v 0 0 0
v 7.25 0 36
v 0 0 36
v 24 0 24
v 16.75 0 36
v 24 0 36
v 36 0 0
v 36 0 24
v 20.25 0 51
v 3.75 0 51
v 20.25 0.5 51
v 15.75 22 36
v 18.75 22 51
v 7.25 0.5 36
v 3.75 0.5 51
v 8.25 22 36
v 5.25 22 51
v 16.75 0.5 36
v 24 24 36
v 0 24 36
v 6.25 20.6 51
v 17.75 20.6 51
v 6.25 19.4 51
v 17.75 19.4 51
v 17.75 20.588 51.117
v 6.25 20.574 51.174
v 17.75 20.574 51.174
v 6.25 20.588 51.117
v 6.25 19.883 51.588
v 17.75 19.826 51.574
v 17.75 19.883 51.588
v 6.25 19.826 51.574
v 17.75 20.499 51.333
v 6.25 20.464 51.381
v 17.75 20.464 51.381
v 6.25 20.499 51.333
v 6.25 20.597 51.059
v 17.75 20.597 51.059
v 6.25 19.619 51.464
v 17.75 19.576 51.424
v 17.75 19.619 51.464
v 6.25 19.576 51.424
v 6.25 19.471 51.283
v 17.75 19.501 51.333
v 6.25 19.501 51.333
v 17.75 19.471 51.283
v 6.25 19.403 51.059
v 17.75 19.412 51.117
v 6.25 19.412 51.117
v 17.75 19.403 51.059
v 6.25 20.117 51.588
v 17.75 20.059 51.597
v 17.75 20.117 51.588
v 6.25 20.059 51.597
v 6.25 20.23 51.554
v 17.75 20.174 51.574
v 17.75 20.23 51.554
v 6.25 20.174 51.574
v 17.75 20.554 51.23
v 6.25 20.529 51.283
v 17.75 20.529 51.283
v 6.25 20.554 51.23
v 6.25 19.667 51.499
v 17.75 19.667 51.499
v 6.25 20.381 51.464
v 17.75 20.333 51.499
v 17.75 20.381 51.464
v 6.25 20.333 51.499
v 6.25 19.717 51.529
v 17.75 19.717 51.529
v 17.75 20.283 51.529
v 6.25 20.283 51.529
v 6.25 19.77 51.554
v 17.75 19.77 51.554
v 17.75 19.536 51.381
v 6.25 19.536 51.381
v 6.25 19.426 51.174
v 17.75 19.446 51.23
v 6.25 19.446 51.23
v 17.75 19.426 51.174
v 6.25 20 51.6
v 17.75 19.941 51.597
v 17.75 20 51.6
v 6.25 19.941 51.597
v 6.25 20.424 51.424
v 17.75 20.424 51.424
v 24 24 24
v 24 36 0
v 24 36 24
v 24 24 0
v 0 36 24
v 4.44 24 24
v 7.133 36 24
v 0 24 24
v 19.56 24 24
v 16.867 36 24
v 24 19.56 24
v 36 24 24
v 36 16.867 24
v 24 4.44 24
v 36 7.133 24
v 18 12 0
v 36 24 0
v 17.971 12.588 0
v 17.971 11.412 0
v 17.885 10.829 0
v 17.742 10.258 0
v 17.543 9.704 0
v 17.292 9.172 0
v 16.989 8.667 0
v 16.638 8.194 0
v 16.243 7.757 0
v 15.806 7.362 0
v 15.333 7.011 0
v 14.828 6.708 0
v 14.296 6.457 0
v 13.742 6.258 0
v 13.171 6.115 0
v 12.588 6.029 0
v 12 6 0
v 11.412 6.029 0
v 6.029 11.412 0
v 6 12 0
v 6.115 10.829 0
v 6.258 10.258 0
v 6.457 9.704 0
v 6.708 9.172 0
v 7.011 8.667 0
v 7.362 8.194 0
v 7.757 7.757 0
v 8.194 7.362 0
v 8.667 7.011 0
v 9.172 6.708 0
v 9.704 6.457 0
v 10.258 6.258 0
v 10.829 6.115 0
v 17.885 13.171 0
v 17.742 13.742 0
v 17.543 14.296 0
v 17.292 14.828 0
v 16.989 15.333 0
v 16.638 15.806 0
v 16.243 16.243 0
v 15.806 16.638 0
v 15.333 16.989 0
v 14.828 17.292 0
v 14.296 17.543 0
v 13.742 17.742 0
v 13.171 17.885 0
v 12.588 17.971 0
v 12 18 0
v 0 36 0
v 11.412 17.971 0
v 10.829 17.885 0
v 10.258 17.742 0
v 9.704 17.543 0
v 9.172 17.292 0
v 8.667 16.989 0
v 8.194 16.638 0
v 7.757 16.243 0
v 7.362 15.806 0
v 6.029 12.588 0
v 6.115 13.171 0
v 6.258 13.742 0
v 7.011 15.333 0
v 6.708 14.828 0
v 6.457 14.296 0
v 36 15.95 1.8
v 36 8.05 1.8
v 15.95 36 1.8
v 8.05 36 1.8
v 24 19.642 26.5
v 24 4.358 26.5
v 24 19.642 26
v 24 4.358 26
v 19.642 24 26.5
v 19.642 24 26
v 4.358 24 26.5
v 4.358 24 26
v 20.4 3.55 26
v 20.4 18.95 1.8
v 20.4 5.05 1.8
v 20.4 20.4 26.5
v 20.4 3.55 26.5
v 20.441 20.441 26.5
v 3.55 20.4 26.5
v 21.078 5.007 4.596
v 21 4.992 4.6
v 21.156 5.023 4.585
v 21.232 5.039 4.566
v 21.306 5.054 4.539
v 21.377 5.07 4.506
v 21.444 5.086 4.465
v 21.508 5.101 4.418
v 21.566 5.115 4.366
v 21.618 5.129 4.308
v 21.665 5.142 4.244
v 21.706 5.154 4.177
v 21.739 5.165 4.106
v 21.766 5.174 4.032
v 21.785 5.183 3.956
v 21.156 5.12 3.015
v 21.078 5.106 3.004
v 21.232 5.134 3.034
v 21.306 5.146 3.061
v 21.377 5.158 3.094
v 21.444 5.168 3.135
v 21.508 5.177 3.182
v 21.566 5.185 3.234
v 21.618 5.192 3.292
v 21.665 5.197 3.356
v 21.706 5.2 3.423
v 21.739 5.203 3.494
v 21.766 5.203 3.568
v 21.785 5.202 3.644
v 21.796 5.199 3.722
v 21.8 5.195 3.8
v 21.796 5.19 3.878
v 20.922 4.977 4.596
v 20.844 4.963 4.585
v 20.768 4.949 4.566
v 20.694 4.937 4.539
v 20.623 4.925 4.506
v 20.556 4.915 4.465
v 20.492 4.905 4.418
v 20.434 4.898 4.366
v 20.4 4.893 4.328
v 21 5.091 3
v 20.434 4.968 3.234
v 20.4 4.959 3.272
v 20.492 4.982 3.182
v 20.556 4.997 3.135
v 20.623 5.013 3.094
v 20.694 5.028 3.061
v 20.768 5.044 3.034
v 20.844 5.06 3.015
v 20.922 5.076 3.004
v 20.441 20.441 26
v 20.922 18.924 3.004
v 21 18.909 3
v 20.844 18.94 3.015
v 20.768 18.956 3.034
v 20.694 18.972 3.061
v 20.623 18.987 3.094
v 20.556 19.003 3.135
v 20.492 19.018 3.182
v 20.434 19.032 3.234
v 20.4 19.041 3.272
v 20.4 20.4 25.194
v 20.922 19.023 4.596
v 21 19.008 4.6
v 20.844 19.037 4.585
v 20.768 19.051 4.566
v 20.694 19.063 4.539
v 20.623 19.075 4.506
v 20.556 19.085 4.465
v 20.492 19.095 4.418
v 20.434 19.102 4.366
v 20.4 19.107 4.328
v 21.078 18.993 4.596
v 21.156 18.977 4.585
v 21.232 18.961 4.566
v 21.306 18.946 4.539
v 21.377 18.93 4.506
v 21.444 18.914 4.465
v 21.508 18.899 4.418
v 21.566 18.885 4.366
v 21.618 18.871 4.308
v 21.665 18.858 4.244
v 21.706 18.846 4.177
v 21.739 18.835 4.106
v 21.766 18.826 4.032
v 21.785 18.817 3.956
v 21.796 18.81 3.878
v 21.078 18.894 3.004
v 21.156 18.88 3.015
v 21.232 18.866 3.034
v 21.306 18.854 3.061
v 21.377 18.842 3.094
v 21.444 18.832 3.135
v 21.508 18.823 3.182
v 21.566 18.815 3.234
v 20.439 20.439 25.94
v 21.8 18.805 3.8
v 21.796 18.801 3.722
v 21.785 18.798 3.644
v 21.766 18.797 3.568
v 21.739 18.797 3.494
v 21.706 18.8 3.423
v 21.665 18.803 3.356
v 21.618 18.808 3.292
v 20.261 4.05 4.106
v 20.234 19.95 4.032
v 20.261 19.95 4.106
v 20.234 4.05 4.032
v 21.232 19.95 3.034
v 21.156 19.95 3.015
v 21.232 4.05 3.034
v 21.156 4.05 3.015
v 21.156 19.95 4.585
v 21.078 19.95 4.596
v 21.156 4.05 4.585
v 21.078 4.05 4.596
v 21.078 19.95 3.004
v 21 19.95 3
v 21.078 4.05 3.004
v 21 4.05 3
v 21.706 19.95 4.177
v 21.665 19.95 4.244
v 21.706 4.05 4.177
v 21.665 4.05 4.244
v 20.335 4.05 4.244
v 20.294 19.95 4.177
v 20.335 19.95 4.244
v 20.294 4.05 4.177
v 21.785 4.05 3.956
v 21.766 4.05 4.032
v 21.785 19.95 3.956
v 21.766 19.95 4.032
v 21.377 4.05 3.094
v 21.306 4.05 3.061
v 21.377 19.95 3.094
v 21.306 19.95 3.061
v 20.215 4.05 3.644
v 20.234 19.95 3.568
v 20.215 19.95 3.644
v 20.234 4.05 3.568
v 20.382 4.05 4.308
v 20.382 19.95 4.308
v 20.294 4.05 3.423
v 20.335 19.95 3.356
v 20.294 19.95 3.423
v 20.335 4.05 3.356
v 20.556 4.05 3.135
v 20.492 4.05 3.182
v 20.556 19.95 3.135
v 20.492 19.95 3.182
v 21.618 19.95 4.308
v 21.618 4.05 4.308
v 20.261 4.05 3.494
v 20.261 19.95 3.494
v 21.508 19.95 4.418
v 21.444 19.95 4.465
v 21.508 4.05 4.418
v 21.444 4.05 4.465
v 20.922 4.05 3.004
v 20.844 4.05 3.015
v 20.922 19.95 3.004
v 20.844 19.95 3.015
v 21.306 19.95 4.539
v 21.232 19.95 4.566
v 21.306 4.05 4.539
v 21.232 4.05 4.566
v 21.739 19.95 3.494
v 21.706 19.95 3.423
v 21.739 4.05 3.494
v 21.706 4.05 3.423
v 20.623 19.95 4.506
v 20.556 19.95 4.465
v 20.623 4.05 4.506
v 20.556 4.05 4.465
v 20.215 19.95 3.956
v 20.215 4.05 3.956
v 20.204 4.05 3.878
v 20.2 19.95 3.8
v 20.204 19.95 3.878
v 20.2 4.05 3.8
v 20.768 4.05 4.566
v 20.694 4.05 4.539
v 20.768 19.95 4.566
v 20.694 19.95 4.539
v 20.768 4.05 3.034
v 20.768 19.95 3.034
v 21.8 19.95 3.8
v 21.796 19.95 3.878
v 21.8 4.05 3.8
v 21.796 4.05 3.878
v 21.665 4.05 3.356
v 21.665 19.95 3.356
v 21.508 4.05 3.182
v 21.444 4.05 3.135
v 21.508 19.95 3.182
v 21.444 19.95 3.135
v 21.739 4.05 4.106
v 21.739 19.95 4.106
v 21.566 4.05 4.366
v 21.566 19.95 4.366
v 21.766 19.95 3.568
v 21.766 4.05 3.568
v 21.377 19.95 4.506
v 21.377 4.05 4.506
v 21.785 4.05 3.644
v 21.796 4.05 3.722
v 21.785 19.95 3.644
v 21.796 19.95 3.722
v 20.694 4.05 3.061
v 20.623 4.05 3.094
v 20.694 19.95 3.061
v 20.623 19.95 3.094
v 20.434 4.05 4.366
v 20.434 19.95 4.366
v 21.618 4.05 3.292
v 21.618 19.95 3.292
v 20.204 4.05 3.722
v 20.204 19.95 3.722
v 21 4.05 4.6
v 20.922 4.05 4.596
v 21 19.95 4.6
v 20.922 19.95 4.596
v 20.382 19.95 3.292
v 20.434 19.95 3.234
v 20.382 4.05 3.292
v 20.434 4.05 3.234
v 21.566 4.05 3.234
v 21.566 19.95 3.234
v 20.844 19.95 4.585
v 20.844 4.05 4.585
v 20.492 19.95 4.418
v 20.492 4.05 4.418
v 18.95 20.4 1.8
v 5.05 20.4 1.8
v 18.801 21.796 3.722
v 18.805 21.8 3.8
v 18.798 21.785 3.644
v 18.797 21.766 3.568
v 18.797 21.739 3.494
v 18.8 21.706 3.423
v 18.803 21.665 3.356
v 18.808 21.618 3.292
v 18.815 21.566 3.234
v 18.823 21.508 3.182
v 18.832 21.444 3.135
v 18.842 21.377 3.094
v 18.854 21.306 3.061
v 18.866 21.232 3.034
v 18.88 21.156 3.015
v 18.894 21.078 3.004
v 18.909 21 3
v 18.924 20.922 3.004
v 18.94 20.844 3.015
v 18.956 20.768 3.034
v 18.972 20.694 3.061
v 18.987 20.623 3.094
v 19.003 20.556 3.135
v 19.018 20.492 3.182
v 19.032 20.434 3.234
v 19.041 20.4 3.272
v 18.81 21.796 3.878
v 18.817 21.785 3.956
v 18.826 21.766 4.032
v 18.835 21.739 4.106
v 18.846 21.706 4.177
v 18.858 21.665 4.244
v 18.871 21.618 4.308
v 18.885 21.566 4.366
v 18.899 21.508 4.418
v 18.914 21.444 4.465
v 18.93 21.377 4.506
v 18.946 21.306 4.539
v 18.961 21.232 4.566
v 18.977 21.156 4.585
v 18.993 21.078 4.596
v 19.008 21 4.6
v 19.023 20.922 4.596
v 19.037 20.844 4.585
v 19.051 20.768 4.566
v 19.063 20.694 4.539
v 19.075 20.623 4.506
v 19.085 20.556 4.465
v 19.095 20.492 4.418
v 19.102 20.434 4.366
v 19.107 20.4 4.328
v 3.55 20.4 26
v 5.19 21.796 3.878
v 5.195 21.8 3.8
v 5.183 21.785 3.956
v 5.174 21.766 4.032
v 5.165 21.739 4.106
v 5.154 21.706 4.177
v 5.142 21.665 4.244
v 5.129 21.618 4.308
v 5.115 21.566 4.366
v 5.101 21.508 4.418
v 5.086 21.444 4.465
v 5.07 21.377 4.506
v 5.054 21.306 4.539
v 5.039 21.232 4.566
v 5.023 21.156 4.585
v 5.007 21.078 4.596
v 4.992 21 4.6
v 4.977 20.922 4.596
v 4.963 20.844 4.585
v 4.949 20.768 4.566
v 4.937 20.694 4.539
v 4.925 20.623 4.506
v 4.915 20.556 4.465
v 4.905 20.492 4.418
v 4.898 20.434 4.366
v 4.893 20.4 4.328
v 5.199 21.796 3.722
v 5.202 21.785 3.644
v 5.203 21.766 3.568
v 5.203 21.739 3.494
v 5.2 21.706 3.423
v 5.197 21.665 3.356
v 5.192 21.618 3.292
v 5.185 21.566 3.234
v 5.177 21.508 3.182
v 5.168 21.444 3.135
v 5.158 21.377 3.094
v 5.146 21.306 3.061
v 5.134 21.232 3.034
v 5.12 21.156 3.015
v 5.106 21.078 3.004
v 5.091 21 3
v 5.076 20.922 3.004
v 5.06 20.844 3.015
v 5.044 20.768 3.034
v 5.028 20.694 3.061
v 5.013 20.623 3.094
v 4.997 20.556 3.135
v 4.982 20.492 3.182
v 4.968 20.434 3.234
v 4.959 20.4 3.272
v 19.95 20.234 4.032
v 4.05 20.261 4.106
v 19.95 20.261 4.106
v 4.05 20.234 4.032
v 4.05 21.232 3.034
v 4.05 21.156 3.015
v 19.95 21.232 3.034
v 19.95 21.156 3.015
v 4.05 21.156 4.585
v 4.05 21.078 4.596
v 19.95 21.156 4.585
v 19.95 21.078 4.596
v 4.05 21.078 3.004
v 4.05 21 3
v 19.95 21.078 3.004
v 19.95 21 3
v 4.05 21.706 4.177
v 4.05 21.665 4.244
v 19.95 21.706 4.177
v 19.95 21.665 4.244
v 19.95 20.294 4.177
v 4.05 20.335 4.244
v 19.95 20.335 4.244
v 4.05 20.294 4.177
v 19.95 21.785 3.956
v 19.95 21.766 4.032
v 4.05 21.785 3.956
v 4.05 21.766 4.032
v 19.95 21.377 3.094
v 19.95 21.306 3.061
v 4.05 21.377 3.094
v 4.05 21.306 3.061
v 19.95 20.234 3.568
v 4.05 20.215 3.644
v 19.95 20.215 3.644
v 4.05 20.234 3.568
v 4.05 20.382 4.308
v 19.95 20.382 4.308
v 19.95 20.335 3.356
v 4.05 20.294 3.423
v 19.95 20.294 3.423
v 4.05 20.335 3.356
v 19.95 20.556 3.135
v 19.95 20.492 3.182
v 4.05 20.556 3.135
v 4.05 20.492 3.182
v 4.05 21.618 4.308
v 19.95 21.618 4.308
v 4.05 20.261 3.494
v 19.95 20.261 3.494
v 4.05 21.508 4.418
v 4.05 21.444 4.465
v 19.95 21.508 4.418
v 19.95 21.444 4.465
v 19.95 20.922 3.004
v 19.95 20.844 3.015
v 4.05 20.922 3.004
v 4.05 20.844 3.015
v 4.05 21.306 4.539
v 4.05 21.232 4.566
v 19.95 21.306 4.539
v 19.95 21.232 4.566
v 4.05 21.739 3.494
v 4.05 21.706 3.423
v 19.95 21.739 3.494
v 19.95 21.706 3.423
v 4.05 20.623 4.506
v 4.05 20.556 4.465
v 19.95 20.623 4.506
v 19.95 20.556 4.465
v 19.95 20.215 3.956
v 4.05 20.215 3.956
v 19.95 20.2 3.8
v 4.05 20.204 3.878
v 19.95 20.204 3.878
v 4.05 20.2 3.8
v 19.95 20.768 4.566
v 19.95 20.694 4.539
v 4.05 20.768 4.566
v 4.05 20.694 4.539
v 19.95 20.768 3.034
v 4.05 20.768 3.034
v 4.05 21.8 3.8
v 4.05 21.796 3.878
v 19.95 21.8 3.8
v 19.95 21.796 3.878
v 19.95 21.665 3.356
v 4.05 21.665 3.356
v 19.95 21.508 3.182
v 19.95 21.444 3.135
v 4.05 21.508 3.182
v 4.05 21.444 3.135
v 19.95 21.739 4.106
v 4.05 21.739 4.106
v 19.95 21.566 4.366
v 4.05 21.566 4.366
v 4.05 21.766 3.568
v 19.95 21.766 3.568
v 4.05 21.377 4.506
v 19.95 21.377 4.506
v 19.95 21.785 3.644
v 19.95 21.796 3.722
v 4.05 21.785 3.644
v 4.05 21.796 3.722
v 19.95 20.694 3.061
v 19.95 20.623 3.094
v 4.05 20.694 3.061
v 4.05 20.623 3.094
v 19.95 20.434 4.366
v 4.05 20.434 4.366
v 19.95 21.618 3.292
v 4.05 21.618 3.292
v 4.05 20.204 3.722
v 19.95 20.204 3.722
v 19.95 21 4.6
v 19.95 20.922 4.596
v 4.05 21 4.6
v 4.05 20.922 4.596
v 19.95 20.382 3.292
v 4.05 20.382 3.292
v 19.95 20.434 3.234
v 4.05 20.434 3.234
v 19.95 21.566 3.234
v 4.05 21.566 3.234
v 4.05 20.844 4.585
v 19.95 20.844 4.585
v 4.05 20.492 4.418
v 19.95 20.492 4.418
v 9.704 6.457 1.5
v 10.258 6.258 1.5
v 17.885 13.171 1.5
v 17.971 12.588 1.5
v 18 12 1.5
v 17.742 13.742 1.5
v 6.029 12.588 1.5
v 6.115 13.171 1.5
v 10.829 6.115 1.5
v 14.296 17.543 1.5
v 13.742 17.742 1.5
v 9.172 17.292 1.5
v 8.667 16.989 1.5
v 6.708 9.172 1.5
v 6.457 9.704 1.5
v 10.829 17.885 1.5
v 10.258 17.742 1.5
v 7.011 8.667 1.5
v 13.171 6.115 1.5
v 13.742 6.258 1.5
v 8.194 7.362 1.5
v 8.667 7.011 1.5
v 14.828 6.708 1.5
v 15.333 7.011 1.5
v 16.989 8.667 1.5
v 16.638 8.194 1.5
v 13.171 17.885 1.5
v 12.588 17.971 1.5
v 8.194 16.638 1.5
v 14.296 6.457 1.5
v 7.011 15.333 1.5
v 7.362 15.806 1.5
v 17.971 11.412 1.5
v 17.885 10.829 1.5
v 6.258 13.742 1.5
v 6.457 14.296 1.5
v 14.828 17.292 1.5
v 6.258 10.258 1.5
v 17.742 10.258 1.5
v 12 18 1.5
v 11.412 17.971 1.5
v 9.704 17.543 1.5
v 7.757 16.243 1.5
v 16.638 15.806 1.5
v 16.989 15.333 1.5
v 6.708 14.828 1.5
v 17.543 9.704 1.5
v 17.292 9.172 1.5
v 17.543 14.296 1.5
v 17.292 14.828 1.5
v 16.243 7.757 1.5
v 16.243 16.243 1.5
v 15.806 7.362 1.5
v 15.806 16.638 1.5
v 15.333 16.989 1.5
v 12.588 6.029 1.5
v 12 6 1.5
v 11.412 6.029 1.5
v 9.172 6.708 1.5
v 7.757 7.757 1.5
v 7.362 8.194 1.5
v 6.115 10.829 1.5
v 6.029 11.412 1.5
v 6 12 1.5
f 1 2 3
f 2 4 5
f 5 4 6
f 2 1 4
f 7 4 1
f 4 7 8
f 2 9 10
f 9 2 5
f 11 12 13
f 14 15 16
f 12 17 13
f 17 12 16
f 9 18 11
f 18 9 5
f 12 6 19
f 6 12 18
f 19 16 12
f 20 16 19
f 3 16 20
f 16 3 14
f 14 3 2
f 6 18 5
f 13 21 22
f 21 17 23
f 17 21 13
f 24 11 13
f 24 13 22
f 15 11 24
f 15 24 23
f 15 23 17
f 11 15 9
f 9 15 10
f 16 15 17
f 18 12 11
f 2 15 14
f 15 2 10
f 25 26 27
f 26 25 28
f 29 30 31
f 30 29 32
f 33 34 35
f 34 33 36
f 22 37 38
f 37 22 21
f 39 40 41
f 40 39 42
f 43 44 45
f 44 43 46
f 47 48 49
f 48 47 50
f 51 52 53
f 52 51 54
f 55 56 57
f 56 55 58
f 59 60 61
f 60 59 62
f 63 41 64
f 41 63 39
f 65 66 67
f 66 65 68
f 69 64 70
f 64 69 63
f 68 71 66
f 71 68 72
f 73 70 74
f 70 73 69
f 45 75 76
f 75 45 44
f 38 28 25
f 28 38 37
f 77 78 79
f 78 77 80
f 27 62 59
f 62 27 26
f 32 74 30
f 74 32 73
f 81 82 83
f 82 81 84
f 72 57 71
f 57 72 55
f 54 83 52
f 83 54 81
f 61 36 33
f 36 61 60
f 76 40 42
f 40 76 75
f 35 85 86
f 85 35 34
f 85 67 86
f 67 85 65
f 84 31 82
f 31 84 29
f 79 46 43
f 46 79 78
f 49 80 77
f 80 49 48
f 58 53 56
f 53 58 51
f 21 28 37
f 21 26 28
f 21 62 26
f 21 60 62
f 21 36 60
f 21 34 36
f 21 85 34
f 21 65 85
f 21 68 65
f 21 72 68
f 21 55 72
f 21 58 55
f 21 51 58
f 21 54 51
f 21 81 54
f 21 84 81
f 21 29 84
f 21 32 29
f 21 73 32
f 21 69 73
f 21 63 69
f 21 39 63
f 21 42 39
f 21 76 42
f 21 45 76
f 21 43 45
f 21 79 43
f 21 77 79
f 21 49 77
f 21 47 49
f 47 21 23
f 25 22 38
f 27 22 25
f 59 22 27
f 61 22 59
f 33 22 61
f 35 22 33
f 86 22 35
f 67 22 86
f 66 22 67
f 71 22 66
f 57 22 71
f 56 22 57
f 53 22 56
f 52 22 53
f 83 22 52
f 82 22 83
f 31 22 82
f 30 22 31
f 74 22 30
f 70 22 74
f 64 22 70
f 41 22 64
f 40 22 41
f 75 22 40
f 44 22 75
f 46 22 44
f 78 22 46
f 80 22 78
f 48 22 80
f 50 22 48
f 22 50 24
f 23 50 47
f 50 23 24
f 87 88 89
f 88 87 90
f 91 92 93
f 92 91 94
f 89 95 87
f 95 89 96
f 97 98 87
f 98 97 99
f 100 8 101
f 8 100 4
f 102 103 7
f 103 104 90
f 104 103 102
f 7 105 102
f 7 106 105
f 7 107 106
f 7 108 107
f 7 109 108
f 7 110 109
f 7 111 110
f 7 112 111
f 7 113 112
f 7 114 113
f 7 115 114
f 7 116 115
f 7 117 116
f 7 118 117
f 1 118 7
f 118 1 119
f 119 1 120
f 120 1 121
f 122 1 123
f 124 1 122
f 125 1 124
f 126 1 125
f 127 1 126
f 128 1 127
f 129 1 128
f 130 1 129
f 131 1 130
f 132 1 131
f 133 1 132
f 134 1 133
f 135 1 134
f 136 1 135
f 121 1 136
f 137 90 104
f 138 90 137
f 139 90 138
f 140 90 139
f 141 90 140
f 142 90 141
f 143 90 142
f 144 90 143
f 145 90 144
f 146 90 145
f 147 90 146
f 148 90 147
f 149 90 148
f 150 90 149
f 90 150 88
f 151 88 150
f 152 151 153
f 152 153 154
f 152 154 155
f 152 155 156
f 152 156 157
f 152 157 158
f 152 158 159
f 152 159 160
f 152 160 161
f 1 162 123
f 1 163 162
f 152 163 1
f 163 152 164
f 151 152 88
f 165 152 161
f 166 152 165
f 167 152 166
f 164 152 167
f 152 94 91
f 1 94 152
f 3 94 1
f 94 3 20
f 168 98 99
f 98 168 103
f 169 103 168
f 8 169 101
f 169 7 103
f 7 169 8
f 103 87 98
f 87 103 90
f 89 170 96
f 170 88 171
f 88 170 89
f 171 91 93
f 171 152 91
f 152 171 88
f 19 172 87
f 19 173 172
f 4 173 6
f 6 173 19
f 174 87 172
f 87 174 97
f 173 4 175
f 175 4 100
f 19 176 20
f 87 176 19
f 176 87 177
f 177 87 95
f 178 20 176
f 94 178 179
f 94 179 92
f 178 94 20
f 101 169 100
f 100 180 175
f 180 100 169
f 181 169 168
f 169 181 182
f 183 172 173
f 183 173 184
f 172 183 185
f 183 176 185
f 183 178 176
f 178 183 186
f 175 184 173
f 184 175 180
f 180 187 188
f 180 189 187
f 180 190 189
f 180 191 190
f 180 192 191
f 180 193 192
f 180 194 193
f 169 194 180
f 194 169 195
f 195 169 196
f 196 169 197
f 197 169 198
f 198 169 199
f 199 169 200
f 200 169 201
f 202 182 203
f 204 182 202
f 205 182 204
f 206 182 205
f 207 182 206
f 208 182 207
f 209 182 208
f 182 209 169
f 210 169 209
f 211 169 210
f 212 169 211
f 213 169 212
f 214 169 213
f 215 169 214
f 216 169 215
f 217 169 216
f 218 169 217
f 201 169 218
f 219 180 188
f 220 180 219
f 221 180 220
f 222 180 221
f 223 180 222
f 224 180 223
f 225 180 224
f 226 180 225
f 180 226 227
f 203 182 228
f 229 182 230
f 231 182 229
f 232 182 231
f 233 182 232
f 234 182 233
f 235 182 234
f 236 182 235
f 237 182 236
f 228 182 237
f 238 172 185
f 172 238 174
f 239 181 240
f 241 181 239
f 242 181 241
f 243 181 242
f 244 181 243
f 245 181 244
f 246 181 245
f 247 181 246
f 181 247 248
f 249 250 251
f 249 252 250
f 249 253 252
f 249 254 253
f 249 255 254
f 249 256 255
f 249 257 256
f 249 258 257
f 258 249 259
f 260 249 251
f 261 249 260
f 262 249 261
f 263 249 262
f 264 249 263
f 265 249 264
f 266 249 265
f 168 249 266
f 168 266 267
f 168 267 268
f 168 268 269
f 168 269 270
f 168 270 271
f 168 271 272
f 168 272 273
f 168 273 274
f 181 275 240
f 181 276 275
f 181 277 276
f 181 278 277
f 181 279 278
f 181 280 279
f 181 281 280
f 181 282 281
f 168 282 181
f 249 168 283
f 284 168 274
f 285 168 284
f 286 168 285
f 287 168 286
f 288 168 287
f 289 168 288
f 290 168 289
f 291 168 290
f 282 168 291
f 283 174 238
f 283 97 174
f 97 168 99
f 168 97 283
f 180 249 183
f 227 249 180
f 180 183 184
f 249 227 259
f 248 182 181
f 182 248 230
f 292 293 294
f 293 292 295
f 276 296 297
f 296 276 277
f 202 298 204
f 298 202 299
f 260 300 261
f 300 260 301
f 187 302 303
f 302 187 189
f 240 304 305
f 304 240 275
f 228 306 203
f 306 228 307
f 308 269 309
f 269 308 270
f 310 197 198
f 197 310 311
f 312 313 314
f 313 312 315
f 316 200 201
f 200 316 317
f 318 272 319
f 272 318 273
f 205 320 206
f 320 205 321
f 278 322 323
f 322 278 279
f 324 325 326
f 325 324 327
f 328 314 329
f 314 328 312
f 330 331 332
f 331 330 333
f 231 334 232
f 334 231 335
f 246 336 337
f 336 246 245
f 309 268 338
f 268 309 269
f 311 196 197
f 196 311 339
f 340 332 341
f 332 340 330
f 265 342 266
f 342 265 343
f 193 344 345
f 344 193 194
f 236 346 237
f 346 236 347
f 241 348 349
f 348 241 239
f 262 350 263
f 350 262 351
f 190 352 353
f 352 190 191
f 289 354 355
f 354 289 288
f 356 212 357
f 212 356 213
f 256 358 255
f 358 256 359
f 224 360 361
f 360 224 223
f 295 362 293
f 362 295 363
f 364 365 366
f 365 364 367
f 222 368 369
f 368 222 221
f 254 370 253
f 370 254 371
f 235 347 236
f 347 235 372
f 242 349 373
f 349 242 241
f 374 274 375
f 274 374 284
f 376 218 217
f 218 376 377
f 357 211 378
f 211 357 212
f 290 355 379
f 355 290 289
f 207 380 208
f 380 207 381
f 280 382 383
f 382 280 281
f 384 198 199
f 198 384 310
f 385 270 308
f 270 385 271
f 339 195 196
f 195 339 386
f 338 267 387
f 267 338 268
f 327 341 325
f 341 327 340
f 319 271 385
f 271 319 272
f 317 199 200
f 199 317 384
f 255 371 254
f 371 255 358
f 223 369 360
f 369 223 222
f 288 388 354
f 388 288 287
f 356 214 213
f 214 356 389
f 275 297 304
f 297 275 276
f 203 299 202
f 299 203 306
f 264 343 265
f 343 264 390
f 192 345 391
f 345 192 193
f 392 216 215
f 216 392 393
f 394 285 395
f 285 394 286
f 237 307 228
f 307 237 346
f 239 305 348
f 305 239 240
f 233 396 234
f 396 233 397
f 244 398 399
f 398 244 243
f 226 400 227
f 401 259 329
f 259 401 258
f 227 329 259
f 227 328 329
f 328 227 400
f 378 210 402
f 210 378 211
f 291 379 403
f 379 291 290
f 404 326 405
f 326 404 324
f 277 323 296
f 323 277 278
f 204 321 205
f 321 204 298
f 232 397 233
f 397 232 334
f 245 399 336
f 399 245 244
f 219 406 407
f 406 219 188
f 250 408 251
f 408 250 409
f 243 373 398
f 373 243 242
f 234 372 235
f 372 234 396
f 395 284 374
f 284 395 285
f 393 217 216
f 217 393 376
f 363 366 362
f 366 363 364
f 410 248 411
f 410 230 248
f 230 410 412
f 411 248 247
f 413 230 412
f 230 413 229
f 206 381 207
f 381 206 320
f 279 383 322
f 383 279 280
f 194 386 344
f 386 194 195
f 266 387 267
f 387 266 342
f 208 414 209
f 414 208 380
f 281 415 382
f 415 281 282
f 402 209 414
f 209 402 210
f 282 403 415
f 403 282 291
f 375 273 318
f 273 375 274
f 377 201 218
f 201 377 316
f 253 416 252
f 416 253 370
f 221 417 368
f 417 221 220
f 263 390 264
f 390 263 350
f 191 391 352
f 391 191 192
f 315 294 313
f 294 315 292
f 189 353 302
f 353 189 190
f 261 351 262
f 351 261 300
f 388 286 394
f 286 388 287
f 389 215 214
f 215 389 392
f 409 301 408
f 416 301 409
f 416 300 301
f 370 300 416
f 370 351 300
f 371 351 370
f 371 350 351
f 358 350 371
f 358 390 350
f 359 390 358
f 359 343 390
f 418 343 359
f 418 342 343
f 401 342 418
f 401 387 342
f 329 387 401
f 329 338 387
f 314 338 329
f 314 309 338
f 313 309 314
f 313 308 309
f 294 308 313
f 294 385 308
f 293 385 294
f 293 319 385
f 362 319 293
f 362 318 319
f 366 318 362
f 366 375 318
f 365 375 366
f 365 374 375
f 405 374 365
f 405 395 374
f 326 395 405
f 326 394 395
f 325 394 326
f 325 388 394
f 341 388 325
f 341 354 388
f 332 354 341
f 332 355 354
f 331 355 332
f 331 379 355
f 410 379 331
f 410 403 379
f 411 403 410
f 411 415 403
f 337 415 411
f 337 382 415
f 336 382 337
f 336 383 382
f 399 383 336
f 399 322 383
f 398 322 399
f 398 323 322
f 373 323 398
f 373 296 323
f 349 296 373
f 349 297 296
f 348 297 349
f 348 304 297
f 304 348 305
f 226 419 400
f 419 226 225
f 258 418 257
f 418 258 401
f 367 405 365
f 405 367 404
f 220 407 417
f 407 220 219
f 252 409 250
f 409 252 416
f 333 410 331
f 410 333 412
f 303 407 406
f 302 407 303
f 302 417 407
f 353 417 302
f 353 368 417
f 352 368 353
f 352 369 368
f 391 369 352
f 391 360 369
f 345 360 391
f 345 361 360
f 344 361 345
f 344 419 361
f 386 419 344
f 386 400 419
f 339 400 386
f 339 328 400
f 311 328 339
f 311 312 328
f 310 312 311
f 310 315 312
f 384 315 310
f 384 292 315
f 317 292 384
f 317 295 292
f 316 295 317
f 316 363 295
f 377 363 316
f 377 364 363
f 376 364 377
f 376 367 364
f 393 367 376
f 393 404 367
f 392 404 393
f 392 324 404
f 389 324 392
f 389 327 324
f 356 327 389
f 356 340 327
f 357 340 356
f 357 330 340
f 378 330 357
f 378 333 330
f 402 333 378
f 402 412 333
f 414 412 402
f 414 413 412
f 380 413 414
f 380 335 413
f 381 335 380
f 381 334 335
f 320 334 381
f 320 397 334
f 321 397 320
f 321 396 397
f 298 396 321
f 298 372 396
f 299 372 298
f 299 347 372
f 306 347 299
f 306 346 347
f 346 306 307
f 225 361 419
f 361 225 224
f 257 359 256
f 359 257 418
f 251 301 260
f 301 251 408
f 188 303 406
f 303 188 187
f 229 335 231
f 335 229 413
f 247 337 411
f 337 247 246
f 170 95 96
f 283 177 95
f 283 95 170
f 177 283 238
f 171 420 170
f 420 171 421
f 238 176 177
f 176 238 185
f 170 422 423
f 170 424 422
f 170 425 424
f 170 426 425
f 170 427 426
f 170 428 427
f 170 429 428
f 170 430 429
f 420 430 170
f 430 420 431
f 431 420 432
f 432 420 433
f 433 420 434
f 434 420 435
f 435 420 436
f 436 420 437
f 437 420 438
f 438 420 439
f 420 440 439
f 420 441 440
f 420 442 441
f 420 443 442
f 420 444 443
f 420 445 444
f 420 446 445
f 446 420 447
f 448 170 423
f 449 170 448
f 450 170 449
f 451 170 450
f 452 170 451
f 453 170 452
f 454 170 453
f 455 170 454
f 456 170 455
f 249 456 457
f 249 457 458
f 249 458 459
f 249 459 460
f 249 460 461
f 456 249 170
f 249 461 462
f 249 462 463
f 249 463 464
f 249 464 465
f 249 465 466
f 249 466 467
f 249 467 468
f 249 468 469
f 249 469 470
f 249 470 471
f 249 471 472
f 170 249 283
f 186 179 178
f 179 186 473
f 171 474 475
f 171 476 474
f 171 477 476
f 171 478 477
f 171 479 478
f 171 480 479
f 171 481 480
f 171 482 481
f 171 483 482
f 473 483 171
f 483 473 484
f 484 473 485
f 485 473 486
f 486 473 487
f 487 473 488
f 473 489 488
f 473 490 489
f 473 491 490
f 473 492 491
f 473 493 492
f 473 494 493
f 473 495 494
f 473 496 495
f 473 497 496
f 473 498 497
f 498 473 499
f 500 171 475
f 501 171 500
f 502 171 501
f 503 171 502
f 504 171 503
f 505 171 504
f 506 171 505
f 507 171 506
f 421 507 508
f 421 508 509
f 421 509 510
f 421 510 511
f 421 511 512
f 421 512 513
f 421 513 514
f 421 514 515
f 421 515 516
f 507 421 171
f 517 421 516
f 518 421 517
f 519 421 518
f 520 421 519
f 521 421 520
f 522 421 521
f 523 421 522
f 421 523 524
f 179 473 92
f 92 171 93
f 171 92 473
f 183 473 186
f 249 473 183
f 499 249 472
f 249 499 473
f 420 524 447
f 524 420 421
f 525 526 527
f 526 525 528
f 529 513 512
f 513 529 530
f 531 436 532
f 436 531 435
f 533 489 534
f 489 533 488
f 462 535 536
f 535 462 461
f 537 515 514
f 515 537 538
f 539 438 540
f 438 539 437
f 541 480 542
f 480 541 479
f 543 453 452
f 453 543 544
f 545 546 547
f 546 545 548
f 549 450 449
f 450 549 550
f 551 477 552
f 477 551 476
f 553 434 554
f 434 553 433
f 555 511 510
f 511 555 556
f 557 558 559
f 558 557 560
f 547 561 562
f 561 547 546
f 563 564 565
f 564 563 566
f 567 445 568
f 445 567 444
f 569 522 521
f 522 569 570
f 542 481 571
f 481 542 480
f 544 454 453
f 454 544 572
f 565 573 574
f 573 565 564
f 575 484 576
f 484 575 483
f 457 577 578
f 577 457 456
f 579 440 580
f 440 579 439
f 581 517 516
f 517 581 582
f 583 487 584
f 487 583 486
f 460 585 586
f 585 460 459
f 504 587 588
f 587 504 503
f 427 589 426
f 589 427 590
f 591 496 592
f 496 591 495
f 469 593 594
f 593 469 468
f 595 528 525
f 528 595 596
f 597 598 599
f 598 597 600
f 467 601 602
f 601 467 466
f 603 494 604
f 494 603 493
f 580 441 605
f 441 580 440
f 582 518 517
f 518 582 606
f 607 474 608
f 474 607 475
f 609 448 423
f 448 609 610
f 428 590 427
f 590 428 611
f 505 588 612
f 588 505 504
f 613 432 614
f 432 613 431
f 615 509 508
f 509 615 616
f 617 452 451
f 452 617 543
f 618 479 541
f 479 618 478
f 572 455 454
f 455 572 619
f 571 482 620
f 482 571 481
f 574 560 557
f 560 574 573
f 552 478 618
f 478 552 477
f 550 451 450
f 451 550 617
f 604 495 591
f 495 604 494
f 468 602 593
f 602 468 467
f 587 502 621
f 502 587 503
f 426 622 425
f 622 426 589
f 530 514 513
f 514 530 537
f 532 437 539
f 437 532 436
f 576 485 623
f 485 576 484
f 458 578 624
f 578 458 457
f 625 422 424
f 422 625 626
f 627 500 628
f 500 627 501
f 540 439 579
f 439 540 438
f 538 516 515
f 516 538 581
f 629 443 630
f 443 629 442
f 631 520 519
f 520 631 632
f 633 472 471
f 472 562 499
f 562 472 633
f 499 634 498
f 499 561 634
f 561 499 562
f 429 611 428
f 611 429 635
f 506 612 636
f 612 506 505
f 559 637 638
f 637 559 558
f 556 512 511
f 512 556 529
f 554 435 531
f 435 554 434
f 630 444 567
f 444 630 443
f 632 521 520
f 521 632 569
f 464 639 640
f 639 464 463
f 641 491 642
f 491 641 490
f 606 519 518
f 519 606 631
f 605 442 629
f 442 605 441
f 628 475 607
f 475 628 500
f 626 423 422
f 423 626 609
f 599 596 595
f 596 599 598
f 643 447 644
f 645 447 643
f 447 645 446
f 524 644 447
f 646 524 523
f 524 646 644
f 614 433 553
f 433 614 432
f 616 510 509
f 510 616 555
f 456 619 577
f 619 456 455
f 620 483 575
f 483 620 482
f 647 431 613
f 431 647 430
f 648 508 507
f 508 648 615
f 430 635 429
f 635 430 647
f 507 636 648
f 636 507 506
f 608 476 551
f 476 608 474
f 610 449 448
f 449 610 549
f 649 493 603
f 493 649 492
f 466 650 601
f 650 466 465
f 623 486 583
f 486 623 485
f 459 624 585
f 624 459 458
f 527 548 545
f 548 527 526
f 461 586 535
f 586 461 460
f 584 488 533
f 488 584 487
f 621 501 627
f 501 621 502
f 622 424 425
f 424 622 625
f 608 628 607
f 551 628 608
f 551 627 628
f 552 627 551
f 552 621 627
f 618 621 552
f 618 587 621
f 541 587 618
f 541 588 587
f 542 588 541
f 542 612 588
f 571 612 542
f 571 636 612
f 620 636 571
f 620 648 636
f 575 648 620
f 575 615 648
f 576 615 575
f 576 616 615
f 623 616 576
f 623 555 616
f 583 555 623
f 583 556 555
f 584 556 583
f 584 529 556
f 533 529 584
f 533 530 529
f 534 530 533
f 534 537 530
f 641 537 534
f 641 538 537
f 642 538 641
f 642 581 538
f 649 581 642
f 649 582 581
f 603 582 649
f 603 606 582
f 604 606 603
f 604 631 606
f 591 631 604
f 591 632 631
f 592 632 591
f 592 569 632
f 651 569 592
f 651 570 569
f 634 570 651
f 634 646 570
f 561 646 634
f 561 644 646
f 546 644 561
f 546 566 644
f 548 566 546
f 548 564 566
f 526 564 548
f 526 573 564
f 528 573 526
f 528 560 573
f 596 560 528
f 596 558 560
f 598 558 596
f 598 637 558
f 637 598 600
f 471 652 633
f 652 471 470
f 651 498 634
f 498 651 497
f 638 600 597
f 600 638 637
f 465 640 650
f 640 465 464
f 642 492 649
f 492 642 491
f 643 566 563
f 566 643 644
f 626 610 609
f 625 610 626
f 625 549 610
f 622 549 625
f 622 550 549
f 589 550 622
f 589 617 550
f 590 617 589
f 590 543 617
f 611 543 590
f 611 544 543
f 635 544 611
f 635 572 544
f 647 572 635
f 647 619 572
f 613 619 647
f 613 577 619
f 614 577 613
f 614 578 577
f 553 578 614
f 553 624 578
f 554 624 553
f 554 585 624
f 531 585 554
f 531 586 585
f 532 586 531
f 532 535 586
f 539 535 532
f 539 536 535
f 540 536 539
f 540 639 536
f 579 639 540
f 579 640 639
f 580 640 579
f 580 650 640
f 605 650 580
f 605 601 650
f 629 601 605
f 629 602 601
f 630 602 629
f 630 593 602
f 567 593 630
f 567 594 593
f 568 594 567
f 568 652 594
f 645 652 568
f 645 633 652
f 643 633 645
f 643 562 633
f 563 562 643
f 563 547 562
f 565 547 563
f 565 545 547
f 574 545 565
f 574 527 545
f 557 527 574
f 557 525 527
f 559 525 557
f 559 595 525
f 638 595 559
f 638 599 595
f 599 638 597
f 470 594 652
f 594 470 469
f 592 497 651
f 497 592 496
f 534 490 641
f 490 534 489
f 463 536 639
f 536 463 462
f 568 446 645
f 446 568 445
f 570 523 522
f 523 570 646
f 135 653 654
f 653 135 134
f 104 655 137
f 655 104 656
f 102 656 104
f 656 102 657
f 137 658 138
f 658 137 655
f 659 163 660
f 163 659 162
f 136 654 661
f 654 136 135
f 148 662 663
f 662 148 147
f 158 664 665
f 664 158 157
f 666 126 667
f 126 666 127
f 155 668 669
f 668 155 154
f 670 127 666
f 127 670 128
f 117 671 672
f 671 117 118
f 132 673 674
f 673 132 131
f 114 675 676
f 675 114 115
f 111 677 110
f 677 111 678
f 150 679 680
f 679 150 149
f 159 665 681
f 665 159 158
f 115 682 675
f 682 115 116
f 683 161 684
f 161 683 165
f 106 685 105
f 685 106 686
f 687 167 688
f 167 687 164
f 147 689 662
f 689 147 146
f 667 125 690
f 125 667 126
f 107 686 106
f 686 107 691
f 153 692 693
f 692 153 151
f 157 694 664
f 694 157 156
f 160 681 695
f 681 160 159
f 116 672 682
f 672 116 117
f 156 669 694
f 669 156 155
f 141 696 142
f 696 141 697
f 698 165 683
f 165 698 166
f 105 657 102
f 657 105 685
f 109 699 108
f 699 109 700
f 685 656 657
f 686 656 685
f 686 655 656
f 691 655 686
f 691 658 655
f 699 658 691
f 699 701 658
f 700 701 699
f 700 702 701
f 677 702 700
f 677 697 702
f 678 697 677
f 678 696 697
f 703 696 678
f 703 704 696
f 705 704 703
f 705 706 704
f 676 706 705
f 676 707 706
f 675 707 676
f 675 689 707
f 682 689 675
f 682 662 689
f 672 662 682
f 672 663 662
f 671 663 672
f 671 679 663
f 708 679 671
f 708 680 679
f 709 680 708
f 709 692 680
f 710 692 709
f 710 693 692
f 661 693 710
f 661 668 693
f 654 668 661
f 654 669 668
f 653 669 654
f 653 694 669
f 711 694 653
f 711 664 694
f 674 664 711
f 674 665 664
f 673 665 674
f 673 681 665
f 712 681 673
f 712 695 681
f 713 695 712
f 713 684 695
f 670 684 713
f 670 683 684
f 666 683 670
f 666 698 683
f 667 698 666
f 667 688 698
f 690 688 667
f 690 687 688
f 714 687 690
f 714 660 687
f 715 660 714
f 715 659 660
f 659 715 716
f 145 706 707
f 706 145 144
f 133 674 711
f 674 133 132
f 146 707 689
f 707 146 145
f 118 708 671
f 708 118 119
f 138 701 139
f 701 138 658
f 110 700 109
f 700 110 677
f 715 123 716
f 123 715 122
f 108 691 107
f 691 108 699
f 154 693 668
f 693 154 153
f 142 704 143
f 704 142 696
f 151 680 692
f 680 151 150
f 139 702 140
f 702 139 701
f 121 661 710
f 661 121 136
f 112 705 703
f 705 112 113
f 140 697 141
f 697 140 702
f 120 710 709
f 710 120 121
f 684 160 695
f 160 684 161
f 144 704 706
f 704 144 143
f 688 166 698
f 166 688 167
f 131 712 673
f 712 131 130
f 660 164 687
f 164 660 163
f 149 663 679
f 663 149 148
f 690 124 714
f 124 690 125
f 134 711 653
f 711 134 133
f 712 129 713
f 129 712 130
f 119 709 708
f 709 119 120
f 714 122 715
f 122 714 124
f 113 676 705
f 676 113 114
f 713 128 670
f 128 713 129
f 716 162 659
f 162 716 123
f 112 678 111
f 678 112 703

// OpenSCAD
// file: ../modules/dovetail.scad
// ====================================================================
// Dual-Taper Wedge Dovetail Module (Peg-Free, Self-Locking)
// Main Frame Wedge & Mini Door Wedge Systems
// ====================================================================
include <../config.scad>

// 2D Profile of Dovetail Slice in X-Y plane
module dovetail_slice_2d(root_w, tip_w, depth) {
    w_r = root_w / 2;
    w_t = tip_w / 2;
    polygon(points = [
        [-w_r, 0],
        [-w_t, depth],
        [ w_t, depth],
        [ w_r, 0]
    ]);
}

// ----------------------------------------------------
// 1. Main Frame Dual-Taper Wedge Dovetail (24 x 24 mm Profile)
// ----------------------------------------------------
module male_dovetail(
    w = BEAM_WIDTH,
    h = BEAM_HEIGHT,
    depth = DOVETAIL_DEPTH,
    tol = 0
) {
    z_bot = -h/2 + 2.0 + tol; // 2mm bottom ledge
    z_top =  h/2 - tol;       // Flush at top of beam
    
    b_root = FRAME_BOT_ROOT - 2*tol;
    b_tip  = FRAME_BOT_TIP  - 2*tol;
    t_root = FRAME_TOP_ROOT - 2*tol;
    t_tip  = FRAME_TOP_TIP  - 2*tol;
    
    union() {
        hull() {
            translate([0, 0, z_bot])
            linear_extrude(height = 0.5)
            dovetail_slice_2d(b_root, b_tip, depth);
            
            translate([0, 0, z_top - 0.5])
            linear_extrude(height = 0.5)
            dovetail_slice_2d(t_root, t_tip, depth);
        }
        
        // Tactile snap detent bead on the tip face at the bottom
        translate([0, depth, z_bot + 2.0])
        rotate([0, 90, 0])
        cylinder(r = 0.6, h = b_tip - 2, center = true);
    }
}

module female_dovetail_pocket(
    w = BEAM_WIDTH,
    h = BEAM_HEIGHT,
    depth = DOVETAIL_DEPTH,
    tol = TOL_DOVETAIL
) {
    z_bot = -h/2 + 2.0 - tol;
    z_top =  h/2 + 2.0; // Open through top
    
    b_root = FRAME_BOT_ROOT + 2*tol;
    b_tip  = FRAME_BOT_TIP  + 2*tol;
    t_root = FRAME_TOP_ROOT + 2*tol;
    t_tip  = FRAME_TOP_TIP  + 2*tol;
    
    union() {
        mirror([0, 1, 0])
        hull() {
            translate([0, 0, z_bot])
            linear_extrude(height = 0.5)
            dovetail_slice_2d(b_root, b_tip, depth + 0.6);
            
            translate([0, 0, z_top])
            linear_extrude(height = 0.5)
            dovetail_slice_2d(t_root, t_tip, depth + 0.6);
        }
        
        // Matching snap detent groove in the pocket floor
        translate([0, -depth, z_bot + 2.0])
        rotate([0, 90, 0])
        cylinder(r = 0.8, h = b_tip + 2, center = true);
    }
}

// ----------------------------------------------------
// 2. Mini Door Dual-Taper Wedge Dovetail (18 x 16 mm Profile)
// ----------------------------------------------------
module mini_male_dovetail(
    w = DOOR_PROFILE_W,
    h = DOOR_PROFILE_T,
    depth = DOOR_DEPTH,
    tol = 0
) {
    z_bot = -h/2 + 1.5 + tol;
    z_top =  h/2 - tol;
    
    b_root = DOOR_BOT_ROOT - 2*tol;
    b_tip  = DOOR_BOT_TIP  - 2*tol;
    t_root = DOOR_TOP_ROOT - 2*tol;
    t_tip  = DOOR_TOP_TIP  - 2*tol;
    
    union() {
        hull() {
            translate([0, 0, z_bot])
            linear_extrude(height = 0.5)
            dovetail_slice_2d(b_root, b_tip, depth);
            
            translate([0, 0, z_top - 0.5])
            linear_extrude(height = 0.5)
            dovetail_slice_2d(t_root, t_tip, depth);
        }
        
        // Snap detent bead
        translate([0, depth, z_bot + 1.5])
        rotate([0, 90, 0])
        cylinder(r = 0.5, h = b_tip - 1.5, center = true);
    }
}

module mini_female_dovetail_pocket(
    w = DOOR_PROFILE_W,
    h = DOOR_PROFILE_T,
    depth = DOOR_DEPTH,
    tol = TOL_DOVETAIL
) {
    z_bot = -h/2 + 1.5 - tol;
    z_top =  h/2 + 2.0; // Open through top
    
    b_root = DOOR_BOT_ROOT + 2*tol;
    b_tip  = DOOR_BOT_TIP  + 2*tol;
    t_root = DOOR_TOP_ROOT + 2*tol;
    t_tip  = DOOR_TOP_TIP  + 2*tol;
    
    union() {
        mirror([0, 1, 0])
        hull() {
            translate([0, 0, z_bot])
            linear_extrude(height = 0.5)
            dovetail_slice_2d(b_root, b_tip, depth + 0.5);
            
            translate([0, 0, z_top])
            linear_extrude(height = 0.5)
            dovetail_slice_2d(t_root, t_tip, depth + 0.5);
        }
        
        // Matching detent groove
        translate([0, -depth, z_bot + 1.5])
        rotate([0, 90, 0])
        cylinder(r = 0.7, h = b_tip + 2, center = true);
    }
}
// file: ../config.scad
// ====================================================================
// Bambu Lab A1 Enclosure - Global Configuration Parameters
// Ultra-Minimal 8-Part Modular Kit (Face-Overlay Architecture)
// ====================================================================

// --- Print Bed Limits ---
MAX_PRINT_X = 256;
MAX_PRINT_Y = 256;
MAX_PRINT_Z = 256;
SAFE_PART_MAX_LEN = 240; // Conservative safety margin for brims

// --- Internal Enclosure Dimensions (mm) ---
// Sized for Bambu Lab A1 bed-slinger travel, right poop bucket, and top BMCU 370c
INTERNAL_WIDTH  = 560; // X axis clearance (A1 + toolhead + right poop bucket)
INTERNAL_DEPTH  = 580; // Y axis clearance (Bed travel + rear cable loop buffer)
INTERNAL_HEIGHT = 710; // Z axis clearance (Gantry + BMCU 370c rotating mount + spool)

// --- Standardized Modular Grid Lengths ---
FRAME_EDGE_LEN  = 185.0; // Standardized length for ALL frame edge segments
DOOR_EDGE_LEN   = 138.0; // Standardized length for ALL door/roof edge segments

// --- Frame Profile Dimensions ---
BEAM_WIDTH   = 24.0;  // Frame beam width X/Y (mm)
BEAM_HEIGHT  = 24.0;  // Frame beam height Z (mm)
CORNER_SIZE  = 36.0;  // 3-way cubic corner junction dimension

// --- Door Profile Dimensions (Slim Face-Overlay) ---
DOOR_PROFILE_W = 18.0; // Width across door frame face (mm)
DOOR_PROFILE_T = 16.0; // Thickness of door frame (mm)
DOOR_CORNER_W  = 25.0; // L-shaped door corner block dimension (mm)

// --- Tolerances (FDM 3D Printing tuned for Bambu Lab A1 0.4mm nozzle) ---
TOL_TIGHT    = 0.15; // Tight press fit (spline clips)
TOL_DOVETAIL = 0.20; // Sliding interlock fit (wedge dovetails)
TOL_HINGE    = 0.30; // Free rotating hinge pins
TOL_LOOSE    = 0.40; // Clearance gaps

// --- Cellophane Spline Groove Specifications ---
GROOVE_WIDTH  = 4.5; // Width of U-channel
GROOVE_DEPTH  = 5.0; // Depth of U-channel

// --- Peg-Free Dual-Taper Wedge Dovetail Dimensions ---
DOVETAIL_DEPTH = 15.0; // Length of wedge insert (mm)

// Main Frame Wedge Dovetail
FRAME_BOT_ROOT = 7.5;  // Bottom root width (narrow entry)
FRAME_BOT_TIP  = 13.5; // Bottom tip width
FRAME_TOP_ROOT = 9.5;  // Top root width (wide wedge lock)
FRAME_TOP_TIP  = 16.5; // Top tip width

// Mini Door Wedge Dovetail (scaled for 18x16 mm door profile)
DOOR_BOT_ROOT  = 5.5;
DOOR_BOT_TIP   = 9.5;
DOOR_TOP_ROOT  = 7.0;
DOOR_TOP_TIP   = 12.0;
DOOR_DEPTH     = 10.0;

// --- Filament PTFE Tube Routing (Bottom Side Beam) ---
PTFE_TUBE_OD  = 4.0; // Standard PTFE bowden tube outer diameter (mm)
PTFE_HOLE_DIA = 4.3; // Slip-fit through-hole diameter with retention grip
PTFE_TUBE_CNT = 4;   // 4 dedicated filament tubes for multi-material / drybox
PTFE_ANGLE    = 35;  // Upward angle toward toolhead/BMCU (degrees)

// --- Render Quality ($fn) ---
$fn = $preview ? 24 : 64;
// main file
// ====================================================================
// 1. Universal Directional 3-Way Corner Block (Part 1 of 8)
// 100% 3D Printable on Bambu Lab A1 (Support-Free)
// Features 2 open-top Female wedge sockets and 1 upright Male wedge tenon.
// Rotated at each vertex of the 8 enclosure corners for continuous daisy-chaining.
// ====================================================================
include <../config.scad>
use <../modules/dovetail.scad>

module corner_part() {
    cs = CORNER_SIZE;
    bw = BEAM_WIDTH;
    bh = BEAM_HEIGHT;
    
    difference() {
        union() {
            // Base corner junction block at [0, 0, 0]
            cube([bw, bw, bw], center = false);
            
            // Branch along +X (24x24 cross-section extending to cs)
            cube([cs, bw, bw], center = false);
            
            // Branch along +Y (24x24 cross-section extending to cs)
            cube([bw, cs, bw], center = false);
            
            // Branch along +Z (24x24 cross-section extending to cs)
            cube([bw, bw, cs], center = false);
            
            // Male wedge tenon on +Z arm (projects upright in +Z direction)
            translate([bw/2, bh/2, cs])
            rotate([90, 0, 0])
            male_dovetail(w = bw, h = bh);
        }
        
        // Female open-top wedge pocket on +X arm (recesses into -X, open at +Z)
        translate([cs, bw/2, bh/2])
        rotate([0, 0, -90])
        female_dovetail_pocket(w = bw, h = bh);
        
        // Female open-top wedge pocket on +Y arm (recesses into -Y, open at +Z)
        translate([bw/2, cs, bh/2])
        female_dovetail_pocket(w = bw, h = bh);
        
        // Rubber bumper foot recess on bottom face (-Z)
        translate([bw/2, bw/2, 0])
        cylinder(d = 12, h = 3, center = true);
    }
}

// Standalone preview
corner_part();
